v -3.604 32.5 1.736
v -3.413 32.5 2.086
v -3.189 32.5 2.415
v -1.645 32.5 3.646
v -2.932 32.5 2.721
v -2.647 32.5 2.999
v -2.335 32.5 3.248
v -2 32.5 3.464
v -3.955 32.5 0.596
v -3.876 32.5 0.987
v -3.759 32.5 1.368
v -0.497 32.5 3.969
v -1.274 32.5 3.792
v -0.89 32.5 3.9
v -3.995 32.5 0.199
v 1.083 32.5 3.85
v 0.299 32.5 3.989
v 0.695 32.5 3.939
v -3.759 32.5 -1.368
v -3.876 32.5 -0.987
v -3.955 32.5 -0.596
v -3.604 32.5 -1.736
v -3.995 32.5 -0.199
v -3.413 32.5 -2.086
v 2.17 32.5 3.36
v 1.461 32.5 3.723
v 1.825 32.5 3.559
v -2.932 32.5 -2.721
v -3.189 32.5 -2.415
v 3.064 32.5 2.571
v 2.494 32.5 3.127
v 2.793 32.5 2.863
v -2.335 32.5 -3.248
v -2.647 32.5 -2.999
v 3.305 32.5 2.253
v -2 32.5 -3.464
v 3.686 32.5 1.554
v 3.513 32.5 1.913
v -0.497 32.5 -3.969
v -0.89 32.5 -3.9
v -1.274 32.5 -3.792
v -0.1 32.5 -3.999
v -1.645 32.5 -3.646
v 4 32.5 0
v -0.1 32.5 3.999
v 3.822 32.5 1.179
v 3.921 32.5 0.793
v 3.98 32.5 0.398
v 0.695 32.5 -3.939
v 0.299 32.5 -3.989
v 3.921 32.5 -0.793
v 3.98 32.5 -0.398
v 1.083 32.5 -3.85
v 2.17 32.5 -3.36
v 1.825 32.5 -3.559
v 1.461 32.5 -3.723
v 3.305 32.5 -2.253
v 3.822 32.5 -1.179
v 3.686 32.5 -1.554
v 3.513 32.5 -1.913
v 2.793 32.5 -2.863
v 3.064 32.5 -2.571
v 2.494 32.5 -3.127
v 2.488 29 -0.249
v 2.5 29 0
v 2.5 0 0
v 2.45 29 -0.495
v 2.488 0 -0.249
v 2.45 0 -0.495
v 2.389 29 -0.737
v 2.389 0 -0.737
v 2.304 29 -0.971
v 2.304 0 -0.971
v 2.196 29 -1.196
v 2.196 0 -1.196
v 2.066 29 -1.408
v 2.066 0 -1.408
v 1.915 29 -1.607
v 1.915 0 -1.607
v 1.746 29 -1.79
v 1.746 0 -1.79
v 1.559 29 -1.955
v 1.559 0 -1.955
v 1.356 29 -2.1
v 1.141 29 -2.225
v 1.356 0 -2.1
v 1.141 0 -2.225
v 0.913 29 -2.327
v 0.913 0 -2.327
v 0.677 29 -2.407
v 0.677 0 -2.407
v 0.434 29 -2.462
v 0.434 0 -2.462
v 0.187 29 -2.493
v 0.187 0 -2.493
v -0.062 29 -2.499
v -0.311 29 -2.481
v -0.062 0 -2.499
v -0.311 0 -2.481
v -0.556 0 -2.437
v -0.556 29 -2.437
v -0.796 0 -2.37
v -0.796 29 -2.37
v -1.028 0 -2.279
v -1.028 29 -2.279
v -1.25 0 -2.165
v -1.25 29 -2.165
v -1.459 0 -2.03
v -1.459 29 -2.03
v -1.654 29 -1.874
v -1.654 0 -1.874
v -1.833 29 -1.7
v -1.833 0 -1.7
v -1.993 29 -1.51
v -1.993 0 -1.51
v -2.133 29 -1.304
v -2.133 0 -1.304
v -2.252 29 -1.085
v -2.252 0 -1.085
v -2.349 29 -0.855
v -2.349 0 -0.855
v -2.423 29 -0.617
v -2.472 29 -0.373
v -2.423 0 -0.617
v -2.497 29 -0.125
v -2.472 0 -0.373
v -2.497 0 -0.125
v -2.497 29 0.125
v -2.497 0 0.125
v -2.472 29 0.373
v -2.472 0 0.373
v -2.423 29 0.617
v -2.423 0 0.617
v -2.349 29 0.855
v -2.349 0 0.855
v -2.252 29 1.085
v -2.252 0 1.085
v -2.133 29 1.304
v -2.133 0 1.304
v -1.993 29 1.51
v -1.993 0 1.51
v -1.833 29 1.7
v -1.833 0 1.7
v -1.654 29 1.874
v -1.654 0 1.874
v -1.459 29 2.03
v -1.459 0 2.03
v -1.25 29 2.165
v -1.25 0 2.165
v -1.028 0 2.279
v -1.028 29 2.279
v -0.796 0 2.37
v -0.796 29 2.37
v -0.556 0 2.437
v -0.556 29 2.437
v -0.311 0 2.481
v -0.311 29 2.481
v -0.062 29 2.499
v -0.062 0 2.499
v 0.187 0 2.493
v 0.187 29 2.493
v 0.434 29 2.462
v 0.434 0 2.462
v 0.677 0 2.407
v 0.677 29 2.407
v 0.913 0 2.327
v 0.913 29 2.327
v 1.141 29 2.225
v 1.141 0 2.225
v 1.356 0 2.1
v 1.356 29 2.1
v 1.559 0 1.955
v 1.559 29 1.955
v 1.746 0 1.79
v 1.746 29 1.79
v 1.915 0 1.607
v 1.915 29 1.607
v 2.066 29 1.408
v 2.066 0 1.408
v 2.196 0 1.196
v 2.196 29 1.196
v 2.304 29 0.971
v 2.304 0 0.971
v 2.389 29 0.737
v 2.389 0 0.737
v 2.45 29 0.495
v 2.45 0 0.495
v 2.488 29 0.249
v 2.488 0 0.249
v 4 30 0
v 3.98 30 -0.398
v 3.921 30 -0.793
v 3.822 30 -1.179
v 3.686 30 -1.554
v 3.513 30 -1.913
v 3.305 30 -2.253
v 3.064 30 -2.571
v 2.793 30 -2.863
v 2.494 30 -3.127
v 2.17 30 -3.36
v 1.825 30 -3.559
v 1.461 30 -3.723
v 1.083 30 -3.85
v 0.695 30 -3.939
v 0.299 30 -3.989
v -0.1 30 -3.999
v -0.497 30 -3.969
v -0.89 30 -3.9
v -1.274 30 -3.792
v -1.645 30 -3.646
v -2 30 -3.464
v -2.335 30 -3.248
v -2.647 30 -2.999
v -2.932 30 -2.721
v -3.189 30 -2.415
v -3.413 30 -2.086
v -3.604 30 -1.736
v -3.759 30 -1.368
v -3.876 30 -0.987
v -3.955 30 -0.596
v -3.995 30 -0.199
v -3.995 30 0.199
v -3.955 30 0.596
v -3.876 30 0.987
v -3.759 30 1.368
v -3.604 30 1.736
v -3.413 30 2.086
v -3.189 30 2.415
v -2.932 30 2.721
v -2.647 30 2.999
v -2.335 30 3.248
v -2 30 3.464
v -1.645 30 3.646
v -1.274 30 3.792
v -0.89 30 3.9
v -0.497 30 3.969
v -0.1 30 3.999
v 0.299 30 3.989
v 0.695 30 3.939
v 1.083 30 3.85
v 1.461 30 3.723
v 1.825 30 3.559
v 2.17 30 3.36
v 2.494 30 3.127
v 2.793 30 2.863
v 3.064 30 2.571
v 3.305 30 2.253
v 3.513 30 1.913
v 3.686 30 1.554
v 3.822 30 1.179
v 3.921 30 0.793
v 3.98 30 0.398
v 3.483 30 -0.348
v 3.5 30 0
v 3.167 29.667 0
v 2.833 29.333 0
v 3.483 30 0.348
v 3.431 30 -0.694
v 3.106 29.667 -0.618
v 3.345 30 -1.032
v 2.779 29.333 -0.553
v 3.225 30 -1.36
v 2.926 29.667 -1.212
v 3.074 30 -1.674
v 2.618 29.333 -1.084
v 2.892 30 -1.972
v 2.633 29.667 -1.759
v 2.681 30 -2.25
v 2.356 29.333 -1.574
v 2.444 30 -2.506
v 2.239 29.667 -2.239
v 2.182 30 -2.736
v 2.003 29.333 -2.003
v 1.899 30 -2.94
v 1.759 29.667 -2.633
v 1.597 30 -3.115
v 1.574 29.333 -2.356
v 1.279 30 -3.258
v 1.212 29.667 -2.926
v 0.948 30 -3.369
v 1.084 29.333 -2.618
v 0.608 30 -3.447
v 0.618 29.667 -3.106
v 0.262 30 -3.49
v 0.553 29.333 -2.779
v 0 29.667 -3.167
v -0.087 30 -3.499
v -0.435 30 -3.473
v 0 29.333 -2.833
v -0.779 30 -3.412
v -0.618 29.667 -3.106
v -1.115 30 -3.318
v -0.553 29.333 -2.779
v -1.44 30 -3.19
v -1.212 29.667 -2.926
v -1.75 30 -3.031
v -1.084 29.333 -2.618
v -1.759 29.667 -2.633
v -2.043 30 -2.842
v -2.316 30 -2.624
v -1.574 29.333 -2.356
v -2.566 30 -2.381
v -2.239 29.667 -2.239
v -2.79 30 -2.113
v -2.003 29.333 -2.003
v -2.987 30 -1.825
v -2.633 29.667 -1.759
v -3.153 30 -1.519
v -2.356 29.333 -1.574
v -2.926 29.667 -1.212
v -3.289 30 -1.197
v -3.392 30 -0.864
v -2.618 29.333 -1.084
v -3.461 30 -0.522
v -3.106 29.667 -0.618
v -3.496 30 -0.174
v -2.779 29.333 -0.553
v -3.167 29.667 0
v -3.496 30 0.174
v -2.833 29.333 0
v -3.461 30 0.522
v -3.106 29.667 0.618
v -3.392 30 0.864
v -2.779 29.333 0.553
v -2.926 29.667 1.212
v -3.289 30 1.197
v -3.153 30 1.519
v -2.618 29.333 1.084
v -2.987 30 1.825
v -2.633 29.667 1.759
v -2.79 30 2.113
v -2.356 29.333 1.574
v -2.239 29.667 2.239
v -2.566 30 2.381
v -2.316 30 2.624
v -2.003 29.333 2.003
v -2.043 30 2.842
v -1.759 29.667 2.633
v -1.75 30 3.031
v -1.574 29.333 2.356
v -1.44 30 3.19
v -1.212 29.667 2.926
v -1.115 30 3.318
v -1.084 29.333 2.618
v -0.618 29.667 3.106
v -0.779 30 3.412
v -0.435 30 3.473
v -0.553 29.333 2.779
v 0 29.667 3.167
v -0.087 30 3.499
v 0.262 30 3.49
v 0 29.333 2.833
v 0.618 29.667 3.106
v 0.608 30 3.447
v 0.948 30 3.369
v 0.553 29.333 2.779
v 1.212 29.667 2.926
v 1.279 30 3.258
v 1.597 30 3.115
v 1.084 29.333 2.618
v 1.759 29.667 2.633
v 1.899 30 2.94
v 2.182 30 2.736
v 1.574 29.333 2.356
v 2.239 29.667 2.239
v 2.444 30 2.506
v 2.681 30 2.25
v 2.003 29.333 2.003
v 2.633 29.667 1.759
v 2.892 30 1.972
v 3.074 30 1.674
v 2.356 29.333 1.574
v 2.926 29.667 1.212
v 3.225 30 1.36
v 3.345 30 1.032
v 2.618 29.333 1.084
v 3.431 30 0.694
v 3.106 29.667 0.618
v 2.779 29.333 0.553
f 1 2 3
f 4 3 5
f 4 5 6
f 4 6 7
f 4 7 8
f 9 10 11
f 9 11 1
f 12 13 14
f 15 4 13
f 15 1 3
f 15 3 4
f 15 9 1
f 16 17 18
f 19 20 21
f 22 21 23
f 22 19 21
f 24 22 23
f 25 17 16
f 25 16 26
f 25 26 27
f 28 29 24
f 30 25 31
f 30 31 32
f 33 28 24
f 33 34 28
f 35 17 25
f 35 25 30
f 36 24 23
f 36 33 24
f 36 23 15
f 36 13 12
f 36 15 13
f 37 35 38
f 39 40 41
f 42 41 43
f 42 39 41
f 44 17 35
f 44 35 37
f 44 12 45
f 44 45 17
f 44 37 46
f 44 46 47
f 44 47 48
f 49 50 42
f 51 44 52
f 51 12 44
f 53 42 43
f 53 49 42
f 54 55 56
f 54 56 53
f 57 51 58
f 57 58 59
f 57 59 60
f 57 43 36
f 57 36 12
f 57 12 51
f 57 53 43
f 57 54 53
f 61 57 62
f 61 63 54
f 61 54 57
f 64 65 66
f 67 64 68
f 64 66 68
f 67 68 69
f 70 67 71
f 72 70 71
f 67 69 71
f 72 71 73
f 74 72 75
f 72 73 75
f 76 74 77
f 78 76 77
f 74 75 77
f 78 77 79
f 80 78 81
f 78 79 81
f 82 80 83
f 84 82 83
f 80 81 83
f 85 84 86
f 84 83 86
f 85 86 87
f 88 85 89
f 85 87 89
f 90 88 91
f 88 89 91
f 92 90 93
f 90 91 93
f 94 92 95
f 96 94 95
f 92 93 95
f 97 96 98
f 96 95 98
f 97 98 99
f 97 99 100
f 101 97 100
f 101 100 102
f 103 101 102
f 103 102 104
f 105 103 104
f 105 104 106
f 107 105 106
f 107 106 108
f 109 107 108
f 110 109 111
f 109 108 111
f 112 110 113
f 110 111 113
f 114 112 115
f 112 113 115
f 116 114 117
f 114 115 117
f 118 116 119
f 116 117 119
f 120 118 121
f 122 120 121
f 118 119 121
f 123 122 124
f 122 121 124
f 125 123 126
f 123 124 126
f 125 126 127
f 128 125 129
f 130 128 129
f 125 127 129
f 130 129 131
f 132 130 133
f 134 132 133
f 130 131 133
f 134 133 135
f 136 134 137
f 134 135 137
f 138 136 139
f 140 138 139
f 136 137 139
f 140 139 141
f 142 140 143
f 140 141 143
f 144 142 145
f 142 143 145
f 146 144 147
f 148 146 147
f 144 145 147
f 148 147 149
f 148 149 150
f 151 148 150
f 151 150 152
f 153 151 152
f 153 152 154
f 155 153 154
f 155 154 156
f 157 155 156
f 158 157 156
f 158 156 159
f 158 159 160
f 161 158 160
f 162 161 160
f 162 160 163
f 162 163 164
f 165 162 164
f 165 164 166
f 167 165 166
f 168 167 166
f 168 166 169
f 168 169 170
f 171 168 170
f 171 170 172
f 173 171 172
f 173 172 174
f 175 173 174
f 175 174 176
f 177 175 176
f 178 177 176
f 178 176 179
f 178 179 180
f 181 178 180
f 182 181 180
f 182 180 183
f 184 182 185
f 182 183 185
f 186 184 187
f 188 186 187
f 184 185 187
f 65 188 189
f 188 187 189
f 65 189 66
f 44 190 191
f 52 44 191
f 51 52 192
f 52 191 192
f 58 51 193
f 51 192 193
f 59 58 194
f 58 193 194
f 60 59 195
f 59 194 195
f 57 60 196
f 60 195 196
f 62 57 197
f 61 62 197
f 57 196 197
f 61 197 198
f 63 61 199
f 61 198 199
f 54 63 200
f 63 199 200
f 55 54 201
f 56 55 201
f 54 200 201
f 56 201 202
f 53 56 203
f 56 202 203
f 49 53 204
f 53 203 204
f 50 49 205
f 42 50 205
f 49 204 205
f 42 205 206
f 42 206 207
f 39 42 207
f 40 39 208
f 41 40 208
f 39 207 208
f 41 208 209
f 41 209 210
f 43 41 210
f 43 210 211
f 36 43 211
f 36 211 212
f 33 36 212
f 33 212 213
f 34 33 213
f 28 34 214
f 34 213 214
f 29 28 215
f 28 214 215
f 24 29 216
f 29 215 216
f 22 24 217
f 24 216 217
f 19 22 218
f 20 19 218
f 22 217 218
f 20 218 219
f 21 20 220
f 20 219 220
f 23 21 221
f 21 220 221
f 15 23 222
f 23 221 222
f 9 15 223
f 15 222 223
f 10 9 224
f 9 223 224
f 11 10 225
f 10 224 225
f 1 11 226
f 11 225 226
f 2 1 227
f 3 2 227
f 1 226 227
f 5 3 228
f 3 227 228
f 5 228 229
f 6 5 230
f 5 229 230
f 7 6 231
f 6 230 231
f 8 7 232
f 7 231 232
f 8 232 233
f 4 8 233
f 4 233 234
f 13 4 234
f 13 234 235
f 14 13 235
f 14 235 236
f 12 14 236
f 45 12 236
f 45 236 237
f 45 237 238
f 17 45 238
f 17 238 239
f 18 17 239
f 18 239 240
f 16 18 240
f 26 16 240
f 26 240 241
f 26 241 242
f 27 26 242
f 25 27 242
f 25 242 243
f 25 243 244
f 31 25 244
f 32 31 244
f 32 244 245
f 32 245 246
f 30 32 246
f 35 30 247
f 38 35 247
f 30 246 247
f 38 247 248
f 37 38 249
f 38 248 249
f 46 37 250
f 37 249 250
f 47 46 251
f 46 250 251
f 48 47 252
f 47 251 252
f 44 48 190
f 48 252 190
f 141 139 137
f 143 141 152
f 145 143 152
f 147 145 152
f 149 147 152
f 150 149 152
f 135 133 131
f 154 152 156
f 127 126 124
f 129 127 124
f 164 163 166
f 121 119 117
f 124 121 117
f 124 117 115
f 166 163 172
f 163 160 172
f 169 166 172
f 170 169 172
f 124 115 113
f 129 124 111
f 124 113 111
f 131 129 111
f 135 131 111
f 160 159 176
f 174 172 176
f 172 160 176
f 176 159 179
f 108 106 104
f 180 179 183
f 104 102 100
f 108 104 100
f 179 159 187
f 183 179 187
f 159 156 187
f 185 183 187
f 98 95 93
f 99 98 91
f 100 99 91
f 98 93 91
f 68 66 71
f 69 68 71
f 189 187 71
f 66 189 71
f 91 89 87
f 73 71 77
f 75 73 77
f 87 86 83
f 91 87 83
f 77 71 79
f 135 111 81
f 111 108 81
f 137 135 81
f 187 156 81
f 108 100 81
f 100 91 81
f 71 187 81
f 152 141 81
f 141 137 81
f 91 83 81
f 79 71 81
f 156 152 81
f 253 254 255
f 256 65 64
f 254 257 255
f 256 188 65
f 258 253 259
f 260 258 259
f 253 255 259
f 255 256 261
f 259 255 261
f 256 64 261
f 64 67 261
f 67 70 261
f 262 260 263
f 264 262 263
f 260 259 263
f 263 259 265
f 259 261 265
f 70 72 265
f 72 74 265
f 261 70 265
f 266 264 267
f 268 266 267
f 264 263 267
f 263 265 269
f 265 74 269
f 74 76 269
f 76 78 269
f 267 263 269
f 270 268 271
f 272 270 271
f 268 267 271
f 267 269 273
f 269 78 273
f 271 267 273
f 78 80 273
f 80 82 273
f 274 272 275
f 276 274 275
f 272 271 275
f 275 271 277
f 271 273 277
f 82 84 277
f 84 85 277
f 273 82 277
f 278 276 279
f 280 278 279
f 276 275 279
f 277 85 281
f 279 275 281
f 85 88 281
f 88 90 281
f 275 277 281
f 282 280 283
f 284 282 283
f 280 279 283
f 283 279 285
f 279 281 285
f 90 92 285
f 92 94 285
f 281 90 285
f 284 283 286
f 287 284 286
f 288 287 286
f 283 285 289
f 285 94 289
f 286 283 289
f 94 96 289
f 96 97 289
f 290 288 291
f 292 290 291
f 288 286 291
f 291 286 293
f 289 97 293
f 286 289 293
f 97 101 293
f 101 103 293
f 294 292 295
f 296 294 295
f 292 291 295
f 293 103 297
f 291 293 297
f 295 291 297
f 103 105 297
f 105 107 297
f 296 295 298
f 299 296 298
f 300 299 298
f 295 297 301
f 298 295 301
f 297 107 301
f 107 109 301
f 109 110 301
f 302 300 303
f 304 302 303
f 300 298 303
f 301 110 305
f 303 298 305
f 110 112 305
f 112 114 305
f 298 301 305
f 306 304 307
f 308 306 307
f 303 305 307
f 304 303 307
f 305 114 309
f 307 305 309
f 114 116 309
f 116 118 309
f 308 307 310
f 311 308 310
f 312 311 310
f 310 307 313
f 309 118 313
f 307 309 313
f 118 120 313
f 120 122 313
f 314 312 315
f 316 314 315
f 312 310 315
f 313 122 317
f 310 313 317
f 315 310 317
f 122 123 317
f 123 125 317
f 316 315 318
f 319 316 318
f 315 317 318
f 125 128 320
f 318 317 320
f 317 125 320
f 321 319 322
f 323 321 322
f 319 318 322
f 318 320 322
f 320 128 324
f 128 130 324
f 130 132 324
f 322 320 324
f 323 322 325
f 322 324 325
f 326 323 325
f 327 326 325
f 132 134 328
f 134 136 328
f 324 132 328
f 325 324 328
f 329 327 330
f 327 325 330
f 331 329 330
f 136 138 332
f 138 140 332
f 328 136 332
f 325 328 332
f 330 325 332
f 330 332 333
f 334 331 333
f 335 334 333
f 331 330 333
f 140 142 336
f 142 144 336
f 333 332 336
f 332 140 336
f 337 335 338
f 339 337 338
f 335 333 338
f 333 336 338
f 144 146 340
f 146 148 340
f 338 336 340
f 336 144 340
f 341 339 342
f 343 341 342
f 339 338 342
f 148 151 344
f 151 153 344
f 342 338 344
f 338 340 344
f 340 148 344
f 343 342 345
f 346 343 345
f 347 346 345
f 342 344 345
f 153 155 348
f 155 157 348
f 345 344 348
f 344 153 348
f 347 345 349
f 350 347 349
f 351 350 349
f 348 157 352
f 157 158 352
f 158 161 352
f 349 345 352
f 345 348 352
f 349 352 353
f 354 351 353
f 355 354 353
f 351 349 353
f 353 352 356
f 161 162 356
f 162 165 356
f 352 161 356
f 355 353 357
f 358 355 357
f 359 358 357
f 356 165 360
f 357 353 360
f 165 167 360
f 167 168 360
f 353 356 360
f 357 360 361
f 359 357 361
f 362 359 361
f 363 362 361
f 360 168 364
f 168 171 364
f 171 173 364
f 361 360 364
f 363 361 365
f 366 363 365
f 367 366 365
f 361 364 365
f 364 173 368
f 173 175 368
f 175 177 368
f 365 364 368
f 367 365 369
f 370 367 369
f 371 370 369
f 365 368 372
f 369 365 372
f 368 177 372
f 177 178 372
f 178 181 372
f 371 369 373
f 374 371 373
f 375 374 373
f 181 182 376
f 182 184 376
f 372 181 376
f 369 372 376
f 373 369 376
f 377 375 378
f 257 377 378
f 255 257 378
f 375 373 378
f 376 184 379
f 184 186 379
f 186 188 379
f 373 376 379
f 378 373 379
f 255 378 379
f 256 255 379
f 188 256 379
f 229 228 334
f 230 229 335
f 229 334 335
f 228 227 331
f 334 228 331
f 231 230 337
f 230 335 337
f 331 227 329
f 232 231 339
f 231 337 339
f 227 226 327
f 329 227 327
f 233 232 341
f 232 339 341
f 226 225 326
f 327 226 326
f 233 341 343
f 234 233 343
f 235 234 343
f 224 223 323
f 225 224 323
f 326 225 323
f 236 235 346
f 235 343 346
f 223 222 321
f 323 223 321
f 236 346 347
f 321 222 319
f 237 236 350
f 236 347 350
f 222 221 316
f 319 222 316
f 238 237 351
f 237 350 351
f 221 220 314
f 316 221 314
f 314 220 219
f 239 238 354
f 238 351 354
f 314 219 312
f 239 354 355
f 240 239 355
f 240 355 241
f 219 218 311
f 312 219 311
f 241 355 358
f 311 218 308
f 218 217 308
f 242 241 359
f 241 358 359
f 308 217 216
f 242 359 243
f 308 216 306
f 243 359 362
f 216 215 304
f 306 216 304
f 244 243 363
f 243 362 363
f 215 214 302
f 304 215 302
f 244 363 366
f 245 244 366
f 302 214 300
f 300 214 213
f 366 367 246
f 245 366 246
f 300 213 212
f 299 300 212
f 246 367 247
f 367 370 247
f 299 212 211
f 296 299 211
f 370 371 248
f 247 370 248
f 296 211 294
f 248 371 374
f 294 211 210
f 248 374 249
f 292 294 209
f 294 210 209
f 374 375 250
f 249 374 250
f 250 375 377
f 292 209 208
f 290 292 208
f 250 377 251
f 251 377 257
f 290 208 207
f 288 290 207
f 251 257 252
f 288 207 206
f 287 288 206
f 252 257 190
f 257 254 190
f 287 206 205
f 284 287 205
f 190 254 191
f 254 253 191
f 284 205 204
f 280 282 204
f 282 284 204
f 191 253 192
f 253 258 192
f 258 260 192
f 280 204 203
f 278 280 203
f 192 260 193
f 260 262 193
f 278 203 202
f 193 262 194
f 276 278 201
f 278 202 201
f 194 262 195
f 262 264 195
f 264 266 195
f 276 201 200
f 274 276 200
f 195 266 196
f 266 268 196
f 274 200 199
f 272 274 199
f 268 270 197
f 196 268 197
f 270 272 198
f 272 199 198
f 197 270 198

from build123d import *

# Parameters (mm, degrees)
SKETCH1_R           = 2.5
BOSS_EXTRUDE1_DEPTH = 30
SKETCH2_R           = 4
BOSS_EXTRUDE2_DEPTH = 2.5
CHAMFER1_SIZE       = 1


with BuildPart() as part:
    # Sketch1 → Boss-Extrude1 (new body)
    with BuildSketch(Plane(origin=(0, 0, 0), x_dir=(1, 0, 0), z_dir=(0, 1, 0))):
        Circle(SKETCH1_R)
    extrude(amount=BOSS_EXTRUDE1_DEPTH)

    # Sketch2 → Boss-Extrude2 (add)
    with BuildSketch(Plane(origin=(0, 30, 0), x_dir=(1, 0, 0), z_dir=(0, 1, 0))):
        Circle(SKETCH2_R)
    extrude(amount=BOSS_EXTRUDE2_DEPTH)

    # Chamfer1
    chamfer1_edges = [part.edges().sort_by_distance(p)[0] for p in [
        (-2.5, 30, 0),
    ]]
    chamfer(chamfer1_edges, length=CHAMFER1_SIZE)


solid = part.part
